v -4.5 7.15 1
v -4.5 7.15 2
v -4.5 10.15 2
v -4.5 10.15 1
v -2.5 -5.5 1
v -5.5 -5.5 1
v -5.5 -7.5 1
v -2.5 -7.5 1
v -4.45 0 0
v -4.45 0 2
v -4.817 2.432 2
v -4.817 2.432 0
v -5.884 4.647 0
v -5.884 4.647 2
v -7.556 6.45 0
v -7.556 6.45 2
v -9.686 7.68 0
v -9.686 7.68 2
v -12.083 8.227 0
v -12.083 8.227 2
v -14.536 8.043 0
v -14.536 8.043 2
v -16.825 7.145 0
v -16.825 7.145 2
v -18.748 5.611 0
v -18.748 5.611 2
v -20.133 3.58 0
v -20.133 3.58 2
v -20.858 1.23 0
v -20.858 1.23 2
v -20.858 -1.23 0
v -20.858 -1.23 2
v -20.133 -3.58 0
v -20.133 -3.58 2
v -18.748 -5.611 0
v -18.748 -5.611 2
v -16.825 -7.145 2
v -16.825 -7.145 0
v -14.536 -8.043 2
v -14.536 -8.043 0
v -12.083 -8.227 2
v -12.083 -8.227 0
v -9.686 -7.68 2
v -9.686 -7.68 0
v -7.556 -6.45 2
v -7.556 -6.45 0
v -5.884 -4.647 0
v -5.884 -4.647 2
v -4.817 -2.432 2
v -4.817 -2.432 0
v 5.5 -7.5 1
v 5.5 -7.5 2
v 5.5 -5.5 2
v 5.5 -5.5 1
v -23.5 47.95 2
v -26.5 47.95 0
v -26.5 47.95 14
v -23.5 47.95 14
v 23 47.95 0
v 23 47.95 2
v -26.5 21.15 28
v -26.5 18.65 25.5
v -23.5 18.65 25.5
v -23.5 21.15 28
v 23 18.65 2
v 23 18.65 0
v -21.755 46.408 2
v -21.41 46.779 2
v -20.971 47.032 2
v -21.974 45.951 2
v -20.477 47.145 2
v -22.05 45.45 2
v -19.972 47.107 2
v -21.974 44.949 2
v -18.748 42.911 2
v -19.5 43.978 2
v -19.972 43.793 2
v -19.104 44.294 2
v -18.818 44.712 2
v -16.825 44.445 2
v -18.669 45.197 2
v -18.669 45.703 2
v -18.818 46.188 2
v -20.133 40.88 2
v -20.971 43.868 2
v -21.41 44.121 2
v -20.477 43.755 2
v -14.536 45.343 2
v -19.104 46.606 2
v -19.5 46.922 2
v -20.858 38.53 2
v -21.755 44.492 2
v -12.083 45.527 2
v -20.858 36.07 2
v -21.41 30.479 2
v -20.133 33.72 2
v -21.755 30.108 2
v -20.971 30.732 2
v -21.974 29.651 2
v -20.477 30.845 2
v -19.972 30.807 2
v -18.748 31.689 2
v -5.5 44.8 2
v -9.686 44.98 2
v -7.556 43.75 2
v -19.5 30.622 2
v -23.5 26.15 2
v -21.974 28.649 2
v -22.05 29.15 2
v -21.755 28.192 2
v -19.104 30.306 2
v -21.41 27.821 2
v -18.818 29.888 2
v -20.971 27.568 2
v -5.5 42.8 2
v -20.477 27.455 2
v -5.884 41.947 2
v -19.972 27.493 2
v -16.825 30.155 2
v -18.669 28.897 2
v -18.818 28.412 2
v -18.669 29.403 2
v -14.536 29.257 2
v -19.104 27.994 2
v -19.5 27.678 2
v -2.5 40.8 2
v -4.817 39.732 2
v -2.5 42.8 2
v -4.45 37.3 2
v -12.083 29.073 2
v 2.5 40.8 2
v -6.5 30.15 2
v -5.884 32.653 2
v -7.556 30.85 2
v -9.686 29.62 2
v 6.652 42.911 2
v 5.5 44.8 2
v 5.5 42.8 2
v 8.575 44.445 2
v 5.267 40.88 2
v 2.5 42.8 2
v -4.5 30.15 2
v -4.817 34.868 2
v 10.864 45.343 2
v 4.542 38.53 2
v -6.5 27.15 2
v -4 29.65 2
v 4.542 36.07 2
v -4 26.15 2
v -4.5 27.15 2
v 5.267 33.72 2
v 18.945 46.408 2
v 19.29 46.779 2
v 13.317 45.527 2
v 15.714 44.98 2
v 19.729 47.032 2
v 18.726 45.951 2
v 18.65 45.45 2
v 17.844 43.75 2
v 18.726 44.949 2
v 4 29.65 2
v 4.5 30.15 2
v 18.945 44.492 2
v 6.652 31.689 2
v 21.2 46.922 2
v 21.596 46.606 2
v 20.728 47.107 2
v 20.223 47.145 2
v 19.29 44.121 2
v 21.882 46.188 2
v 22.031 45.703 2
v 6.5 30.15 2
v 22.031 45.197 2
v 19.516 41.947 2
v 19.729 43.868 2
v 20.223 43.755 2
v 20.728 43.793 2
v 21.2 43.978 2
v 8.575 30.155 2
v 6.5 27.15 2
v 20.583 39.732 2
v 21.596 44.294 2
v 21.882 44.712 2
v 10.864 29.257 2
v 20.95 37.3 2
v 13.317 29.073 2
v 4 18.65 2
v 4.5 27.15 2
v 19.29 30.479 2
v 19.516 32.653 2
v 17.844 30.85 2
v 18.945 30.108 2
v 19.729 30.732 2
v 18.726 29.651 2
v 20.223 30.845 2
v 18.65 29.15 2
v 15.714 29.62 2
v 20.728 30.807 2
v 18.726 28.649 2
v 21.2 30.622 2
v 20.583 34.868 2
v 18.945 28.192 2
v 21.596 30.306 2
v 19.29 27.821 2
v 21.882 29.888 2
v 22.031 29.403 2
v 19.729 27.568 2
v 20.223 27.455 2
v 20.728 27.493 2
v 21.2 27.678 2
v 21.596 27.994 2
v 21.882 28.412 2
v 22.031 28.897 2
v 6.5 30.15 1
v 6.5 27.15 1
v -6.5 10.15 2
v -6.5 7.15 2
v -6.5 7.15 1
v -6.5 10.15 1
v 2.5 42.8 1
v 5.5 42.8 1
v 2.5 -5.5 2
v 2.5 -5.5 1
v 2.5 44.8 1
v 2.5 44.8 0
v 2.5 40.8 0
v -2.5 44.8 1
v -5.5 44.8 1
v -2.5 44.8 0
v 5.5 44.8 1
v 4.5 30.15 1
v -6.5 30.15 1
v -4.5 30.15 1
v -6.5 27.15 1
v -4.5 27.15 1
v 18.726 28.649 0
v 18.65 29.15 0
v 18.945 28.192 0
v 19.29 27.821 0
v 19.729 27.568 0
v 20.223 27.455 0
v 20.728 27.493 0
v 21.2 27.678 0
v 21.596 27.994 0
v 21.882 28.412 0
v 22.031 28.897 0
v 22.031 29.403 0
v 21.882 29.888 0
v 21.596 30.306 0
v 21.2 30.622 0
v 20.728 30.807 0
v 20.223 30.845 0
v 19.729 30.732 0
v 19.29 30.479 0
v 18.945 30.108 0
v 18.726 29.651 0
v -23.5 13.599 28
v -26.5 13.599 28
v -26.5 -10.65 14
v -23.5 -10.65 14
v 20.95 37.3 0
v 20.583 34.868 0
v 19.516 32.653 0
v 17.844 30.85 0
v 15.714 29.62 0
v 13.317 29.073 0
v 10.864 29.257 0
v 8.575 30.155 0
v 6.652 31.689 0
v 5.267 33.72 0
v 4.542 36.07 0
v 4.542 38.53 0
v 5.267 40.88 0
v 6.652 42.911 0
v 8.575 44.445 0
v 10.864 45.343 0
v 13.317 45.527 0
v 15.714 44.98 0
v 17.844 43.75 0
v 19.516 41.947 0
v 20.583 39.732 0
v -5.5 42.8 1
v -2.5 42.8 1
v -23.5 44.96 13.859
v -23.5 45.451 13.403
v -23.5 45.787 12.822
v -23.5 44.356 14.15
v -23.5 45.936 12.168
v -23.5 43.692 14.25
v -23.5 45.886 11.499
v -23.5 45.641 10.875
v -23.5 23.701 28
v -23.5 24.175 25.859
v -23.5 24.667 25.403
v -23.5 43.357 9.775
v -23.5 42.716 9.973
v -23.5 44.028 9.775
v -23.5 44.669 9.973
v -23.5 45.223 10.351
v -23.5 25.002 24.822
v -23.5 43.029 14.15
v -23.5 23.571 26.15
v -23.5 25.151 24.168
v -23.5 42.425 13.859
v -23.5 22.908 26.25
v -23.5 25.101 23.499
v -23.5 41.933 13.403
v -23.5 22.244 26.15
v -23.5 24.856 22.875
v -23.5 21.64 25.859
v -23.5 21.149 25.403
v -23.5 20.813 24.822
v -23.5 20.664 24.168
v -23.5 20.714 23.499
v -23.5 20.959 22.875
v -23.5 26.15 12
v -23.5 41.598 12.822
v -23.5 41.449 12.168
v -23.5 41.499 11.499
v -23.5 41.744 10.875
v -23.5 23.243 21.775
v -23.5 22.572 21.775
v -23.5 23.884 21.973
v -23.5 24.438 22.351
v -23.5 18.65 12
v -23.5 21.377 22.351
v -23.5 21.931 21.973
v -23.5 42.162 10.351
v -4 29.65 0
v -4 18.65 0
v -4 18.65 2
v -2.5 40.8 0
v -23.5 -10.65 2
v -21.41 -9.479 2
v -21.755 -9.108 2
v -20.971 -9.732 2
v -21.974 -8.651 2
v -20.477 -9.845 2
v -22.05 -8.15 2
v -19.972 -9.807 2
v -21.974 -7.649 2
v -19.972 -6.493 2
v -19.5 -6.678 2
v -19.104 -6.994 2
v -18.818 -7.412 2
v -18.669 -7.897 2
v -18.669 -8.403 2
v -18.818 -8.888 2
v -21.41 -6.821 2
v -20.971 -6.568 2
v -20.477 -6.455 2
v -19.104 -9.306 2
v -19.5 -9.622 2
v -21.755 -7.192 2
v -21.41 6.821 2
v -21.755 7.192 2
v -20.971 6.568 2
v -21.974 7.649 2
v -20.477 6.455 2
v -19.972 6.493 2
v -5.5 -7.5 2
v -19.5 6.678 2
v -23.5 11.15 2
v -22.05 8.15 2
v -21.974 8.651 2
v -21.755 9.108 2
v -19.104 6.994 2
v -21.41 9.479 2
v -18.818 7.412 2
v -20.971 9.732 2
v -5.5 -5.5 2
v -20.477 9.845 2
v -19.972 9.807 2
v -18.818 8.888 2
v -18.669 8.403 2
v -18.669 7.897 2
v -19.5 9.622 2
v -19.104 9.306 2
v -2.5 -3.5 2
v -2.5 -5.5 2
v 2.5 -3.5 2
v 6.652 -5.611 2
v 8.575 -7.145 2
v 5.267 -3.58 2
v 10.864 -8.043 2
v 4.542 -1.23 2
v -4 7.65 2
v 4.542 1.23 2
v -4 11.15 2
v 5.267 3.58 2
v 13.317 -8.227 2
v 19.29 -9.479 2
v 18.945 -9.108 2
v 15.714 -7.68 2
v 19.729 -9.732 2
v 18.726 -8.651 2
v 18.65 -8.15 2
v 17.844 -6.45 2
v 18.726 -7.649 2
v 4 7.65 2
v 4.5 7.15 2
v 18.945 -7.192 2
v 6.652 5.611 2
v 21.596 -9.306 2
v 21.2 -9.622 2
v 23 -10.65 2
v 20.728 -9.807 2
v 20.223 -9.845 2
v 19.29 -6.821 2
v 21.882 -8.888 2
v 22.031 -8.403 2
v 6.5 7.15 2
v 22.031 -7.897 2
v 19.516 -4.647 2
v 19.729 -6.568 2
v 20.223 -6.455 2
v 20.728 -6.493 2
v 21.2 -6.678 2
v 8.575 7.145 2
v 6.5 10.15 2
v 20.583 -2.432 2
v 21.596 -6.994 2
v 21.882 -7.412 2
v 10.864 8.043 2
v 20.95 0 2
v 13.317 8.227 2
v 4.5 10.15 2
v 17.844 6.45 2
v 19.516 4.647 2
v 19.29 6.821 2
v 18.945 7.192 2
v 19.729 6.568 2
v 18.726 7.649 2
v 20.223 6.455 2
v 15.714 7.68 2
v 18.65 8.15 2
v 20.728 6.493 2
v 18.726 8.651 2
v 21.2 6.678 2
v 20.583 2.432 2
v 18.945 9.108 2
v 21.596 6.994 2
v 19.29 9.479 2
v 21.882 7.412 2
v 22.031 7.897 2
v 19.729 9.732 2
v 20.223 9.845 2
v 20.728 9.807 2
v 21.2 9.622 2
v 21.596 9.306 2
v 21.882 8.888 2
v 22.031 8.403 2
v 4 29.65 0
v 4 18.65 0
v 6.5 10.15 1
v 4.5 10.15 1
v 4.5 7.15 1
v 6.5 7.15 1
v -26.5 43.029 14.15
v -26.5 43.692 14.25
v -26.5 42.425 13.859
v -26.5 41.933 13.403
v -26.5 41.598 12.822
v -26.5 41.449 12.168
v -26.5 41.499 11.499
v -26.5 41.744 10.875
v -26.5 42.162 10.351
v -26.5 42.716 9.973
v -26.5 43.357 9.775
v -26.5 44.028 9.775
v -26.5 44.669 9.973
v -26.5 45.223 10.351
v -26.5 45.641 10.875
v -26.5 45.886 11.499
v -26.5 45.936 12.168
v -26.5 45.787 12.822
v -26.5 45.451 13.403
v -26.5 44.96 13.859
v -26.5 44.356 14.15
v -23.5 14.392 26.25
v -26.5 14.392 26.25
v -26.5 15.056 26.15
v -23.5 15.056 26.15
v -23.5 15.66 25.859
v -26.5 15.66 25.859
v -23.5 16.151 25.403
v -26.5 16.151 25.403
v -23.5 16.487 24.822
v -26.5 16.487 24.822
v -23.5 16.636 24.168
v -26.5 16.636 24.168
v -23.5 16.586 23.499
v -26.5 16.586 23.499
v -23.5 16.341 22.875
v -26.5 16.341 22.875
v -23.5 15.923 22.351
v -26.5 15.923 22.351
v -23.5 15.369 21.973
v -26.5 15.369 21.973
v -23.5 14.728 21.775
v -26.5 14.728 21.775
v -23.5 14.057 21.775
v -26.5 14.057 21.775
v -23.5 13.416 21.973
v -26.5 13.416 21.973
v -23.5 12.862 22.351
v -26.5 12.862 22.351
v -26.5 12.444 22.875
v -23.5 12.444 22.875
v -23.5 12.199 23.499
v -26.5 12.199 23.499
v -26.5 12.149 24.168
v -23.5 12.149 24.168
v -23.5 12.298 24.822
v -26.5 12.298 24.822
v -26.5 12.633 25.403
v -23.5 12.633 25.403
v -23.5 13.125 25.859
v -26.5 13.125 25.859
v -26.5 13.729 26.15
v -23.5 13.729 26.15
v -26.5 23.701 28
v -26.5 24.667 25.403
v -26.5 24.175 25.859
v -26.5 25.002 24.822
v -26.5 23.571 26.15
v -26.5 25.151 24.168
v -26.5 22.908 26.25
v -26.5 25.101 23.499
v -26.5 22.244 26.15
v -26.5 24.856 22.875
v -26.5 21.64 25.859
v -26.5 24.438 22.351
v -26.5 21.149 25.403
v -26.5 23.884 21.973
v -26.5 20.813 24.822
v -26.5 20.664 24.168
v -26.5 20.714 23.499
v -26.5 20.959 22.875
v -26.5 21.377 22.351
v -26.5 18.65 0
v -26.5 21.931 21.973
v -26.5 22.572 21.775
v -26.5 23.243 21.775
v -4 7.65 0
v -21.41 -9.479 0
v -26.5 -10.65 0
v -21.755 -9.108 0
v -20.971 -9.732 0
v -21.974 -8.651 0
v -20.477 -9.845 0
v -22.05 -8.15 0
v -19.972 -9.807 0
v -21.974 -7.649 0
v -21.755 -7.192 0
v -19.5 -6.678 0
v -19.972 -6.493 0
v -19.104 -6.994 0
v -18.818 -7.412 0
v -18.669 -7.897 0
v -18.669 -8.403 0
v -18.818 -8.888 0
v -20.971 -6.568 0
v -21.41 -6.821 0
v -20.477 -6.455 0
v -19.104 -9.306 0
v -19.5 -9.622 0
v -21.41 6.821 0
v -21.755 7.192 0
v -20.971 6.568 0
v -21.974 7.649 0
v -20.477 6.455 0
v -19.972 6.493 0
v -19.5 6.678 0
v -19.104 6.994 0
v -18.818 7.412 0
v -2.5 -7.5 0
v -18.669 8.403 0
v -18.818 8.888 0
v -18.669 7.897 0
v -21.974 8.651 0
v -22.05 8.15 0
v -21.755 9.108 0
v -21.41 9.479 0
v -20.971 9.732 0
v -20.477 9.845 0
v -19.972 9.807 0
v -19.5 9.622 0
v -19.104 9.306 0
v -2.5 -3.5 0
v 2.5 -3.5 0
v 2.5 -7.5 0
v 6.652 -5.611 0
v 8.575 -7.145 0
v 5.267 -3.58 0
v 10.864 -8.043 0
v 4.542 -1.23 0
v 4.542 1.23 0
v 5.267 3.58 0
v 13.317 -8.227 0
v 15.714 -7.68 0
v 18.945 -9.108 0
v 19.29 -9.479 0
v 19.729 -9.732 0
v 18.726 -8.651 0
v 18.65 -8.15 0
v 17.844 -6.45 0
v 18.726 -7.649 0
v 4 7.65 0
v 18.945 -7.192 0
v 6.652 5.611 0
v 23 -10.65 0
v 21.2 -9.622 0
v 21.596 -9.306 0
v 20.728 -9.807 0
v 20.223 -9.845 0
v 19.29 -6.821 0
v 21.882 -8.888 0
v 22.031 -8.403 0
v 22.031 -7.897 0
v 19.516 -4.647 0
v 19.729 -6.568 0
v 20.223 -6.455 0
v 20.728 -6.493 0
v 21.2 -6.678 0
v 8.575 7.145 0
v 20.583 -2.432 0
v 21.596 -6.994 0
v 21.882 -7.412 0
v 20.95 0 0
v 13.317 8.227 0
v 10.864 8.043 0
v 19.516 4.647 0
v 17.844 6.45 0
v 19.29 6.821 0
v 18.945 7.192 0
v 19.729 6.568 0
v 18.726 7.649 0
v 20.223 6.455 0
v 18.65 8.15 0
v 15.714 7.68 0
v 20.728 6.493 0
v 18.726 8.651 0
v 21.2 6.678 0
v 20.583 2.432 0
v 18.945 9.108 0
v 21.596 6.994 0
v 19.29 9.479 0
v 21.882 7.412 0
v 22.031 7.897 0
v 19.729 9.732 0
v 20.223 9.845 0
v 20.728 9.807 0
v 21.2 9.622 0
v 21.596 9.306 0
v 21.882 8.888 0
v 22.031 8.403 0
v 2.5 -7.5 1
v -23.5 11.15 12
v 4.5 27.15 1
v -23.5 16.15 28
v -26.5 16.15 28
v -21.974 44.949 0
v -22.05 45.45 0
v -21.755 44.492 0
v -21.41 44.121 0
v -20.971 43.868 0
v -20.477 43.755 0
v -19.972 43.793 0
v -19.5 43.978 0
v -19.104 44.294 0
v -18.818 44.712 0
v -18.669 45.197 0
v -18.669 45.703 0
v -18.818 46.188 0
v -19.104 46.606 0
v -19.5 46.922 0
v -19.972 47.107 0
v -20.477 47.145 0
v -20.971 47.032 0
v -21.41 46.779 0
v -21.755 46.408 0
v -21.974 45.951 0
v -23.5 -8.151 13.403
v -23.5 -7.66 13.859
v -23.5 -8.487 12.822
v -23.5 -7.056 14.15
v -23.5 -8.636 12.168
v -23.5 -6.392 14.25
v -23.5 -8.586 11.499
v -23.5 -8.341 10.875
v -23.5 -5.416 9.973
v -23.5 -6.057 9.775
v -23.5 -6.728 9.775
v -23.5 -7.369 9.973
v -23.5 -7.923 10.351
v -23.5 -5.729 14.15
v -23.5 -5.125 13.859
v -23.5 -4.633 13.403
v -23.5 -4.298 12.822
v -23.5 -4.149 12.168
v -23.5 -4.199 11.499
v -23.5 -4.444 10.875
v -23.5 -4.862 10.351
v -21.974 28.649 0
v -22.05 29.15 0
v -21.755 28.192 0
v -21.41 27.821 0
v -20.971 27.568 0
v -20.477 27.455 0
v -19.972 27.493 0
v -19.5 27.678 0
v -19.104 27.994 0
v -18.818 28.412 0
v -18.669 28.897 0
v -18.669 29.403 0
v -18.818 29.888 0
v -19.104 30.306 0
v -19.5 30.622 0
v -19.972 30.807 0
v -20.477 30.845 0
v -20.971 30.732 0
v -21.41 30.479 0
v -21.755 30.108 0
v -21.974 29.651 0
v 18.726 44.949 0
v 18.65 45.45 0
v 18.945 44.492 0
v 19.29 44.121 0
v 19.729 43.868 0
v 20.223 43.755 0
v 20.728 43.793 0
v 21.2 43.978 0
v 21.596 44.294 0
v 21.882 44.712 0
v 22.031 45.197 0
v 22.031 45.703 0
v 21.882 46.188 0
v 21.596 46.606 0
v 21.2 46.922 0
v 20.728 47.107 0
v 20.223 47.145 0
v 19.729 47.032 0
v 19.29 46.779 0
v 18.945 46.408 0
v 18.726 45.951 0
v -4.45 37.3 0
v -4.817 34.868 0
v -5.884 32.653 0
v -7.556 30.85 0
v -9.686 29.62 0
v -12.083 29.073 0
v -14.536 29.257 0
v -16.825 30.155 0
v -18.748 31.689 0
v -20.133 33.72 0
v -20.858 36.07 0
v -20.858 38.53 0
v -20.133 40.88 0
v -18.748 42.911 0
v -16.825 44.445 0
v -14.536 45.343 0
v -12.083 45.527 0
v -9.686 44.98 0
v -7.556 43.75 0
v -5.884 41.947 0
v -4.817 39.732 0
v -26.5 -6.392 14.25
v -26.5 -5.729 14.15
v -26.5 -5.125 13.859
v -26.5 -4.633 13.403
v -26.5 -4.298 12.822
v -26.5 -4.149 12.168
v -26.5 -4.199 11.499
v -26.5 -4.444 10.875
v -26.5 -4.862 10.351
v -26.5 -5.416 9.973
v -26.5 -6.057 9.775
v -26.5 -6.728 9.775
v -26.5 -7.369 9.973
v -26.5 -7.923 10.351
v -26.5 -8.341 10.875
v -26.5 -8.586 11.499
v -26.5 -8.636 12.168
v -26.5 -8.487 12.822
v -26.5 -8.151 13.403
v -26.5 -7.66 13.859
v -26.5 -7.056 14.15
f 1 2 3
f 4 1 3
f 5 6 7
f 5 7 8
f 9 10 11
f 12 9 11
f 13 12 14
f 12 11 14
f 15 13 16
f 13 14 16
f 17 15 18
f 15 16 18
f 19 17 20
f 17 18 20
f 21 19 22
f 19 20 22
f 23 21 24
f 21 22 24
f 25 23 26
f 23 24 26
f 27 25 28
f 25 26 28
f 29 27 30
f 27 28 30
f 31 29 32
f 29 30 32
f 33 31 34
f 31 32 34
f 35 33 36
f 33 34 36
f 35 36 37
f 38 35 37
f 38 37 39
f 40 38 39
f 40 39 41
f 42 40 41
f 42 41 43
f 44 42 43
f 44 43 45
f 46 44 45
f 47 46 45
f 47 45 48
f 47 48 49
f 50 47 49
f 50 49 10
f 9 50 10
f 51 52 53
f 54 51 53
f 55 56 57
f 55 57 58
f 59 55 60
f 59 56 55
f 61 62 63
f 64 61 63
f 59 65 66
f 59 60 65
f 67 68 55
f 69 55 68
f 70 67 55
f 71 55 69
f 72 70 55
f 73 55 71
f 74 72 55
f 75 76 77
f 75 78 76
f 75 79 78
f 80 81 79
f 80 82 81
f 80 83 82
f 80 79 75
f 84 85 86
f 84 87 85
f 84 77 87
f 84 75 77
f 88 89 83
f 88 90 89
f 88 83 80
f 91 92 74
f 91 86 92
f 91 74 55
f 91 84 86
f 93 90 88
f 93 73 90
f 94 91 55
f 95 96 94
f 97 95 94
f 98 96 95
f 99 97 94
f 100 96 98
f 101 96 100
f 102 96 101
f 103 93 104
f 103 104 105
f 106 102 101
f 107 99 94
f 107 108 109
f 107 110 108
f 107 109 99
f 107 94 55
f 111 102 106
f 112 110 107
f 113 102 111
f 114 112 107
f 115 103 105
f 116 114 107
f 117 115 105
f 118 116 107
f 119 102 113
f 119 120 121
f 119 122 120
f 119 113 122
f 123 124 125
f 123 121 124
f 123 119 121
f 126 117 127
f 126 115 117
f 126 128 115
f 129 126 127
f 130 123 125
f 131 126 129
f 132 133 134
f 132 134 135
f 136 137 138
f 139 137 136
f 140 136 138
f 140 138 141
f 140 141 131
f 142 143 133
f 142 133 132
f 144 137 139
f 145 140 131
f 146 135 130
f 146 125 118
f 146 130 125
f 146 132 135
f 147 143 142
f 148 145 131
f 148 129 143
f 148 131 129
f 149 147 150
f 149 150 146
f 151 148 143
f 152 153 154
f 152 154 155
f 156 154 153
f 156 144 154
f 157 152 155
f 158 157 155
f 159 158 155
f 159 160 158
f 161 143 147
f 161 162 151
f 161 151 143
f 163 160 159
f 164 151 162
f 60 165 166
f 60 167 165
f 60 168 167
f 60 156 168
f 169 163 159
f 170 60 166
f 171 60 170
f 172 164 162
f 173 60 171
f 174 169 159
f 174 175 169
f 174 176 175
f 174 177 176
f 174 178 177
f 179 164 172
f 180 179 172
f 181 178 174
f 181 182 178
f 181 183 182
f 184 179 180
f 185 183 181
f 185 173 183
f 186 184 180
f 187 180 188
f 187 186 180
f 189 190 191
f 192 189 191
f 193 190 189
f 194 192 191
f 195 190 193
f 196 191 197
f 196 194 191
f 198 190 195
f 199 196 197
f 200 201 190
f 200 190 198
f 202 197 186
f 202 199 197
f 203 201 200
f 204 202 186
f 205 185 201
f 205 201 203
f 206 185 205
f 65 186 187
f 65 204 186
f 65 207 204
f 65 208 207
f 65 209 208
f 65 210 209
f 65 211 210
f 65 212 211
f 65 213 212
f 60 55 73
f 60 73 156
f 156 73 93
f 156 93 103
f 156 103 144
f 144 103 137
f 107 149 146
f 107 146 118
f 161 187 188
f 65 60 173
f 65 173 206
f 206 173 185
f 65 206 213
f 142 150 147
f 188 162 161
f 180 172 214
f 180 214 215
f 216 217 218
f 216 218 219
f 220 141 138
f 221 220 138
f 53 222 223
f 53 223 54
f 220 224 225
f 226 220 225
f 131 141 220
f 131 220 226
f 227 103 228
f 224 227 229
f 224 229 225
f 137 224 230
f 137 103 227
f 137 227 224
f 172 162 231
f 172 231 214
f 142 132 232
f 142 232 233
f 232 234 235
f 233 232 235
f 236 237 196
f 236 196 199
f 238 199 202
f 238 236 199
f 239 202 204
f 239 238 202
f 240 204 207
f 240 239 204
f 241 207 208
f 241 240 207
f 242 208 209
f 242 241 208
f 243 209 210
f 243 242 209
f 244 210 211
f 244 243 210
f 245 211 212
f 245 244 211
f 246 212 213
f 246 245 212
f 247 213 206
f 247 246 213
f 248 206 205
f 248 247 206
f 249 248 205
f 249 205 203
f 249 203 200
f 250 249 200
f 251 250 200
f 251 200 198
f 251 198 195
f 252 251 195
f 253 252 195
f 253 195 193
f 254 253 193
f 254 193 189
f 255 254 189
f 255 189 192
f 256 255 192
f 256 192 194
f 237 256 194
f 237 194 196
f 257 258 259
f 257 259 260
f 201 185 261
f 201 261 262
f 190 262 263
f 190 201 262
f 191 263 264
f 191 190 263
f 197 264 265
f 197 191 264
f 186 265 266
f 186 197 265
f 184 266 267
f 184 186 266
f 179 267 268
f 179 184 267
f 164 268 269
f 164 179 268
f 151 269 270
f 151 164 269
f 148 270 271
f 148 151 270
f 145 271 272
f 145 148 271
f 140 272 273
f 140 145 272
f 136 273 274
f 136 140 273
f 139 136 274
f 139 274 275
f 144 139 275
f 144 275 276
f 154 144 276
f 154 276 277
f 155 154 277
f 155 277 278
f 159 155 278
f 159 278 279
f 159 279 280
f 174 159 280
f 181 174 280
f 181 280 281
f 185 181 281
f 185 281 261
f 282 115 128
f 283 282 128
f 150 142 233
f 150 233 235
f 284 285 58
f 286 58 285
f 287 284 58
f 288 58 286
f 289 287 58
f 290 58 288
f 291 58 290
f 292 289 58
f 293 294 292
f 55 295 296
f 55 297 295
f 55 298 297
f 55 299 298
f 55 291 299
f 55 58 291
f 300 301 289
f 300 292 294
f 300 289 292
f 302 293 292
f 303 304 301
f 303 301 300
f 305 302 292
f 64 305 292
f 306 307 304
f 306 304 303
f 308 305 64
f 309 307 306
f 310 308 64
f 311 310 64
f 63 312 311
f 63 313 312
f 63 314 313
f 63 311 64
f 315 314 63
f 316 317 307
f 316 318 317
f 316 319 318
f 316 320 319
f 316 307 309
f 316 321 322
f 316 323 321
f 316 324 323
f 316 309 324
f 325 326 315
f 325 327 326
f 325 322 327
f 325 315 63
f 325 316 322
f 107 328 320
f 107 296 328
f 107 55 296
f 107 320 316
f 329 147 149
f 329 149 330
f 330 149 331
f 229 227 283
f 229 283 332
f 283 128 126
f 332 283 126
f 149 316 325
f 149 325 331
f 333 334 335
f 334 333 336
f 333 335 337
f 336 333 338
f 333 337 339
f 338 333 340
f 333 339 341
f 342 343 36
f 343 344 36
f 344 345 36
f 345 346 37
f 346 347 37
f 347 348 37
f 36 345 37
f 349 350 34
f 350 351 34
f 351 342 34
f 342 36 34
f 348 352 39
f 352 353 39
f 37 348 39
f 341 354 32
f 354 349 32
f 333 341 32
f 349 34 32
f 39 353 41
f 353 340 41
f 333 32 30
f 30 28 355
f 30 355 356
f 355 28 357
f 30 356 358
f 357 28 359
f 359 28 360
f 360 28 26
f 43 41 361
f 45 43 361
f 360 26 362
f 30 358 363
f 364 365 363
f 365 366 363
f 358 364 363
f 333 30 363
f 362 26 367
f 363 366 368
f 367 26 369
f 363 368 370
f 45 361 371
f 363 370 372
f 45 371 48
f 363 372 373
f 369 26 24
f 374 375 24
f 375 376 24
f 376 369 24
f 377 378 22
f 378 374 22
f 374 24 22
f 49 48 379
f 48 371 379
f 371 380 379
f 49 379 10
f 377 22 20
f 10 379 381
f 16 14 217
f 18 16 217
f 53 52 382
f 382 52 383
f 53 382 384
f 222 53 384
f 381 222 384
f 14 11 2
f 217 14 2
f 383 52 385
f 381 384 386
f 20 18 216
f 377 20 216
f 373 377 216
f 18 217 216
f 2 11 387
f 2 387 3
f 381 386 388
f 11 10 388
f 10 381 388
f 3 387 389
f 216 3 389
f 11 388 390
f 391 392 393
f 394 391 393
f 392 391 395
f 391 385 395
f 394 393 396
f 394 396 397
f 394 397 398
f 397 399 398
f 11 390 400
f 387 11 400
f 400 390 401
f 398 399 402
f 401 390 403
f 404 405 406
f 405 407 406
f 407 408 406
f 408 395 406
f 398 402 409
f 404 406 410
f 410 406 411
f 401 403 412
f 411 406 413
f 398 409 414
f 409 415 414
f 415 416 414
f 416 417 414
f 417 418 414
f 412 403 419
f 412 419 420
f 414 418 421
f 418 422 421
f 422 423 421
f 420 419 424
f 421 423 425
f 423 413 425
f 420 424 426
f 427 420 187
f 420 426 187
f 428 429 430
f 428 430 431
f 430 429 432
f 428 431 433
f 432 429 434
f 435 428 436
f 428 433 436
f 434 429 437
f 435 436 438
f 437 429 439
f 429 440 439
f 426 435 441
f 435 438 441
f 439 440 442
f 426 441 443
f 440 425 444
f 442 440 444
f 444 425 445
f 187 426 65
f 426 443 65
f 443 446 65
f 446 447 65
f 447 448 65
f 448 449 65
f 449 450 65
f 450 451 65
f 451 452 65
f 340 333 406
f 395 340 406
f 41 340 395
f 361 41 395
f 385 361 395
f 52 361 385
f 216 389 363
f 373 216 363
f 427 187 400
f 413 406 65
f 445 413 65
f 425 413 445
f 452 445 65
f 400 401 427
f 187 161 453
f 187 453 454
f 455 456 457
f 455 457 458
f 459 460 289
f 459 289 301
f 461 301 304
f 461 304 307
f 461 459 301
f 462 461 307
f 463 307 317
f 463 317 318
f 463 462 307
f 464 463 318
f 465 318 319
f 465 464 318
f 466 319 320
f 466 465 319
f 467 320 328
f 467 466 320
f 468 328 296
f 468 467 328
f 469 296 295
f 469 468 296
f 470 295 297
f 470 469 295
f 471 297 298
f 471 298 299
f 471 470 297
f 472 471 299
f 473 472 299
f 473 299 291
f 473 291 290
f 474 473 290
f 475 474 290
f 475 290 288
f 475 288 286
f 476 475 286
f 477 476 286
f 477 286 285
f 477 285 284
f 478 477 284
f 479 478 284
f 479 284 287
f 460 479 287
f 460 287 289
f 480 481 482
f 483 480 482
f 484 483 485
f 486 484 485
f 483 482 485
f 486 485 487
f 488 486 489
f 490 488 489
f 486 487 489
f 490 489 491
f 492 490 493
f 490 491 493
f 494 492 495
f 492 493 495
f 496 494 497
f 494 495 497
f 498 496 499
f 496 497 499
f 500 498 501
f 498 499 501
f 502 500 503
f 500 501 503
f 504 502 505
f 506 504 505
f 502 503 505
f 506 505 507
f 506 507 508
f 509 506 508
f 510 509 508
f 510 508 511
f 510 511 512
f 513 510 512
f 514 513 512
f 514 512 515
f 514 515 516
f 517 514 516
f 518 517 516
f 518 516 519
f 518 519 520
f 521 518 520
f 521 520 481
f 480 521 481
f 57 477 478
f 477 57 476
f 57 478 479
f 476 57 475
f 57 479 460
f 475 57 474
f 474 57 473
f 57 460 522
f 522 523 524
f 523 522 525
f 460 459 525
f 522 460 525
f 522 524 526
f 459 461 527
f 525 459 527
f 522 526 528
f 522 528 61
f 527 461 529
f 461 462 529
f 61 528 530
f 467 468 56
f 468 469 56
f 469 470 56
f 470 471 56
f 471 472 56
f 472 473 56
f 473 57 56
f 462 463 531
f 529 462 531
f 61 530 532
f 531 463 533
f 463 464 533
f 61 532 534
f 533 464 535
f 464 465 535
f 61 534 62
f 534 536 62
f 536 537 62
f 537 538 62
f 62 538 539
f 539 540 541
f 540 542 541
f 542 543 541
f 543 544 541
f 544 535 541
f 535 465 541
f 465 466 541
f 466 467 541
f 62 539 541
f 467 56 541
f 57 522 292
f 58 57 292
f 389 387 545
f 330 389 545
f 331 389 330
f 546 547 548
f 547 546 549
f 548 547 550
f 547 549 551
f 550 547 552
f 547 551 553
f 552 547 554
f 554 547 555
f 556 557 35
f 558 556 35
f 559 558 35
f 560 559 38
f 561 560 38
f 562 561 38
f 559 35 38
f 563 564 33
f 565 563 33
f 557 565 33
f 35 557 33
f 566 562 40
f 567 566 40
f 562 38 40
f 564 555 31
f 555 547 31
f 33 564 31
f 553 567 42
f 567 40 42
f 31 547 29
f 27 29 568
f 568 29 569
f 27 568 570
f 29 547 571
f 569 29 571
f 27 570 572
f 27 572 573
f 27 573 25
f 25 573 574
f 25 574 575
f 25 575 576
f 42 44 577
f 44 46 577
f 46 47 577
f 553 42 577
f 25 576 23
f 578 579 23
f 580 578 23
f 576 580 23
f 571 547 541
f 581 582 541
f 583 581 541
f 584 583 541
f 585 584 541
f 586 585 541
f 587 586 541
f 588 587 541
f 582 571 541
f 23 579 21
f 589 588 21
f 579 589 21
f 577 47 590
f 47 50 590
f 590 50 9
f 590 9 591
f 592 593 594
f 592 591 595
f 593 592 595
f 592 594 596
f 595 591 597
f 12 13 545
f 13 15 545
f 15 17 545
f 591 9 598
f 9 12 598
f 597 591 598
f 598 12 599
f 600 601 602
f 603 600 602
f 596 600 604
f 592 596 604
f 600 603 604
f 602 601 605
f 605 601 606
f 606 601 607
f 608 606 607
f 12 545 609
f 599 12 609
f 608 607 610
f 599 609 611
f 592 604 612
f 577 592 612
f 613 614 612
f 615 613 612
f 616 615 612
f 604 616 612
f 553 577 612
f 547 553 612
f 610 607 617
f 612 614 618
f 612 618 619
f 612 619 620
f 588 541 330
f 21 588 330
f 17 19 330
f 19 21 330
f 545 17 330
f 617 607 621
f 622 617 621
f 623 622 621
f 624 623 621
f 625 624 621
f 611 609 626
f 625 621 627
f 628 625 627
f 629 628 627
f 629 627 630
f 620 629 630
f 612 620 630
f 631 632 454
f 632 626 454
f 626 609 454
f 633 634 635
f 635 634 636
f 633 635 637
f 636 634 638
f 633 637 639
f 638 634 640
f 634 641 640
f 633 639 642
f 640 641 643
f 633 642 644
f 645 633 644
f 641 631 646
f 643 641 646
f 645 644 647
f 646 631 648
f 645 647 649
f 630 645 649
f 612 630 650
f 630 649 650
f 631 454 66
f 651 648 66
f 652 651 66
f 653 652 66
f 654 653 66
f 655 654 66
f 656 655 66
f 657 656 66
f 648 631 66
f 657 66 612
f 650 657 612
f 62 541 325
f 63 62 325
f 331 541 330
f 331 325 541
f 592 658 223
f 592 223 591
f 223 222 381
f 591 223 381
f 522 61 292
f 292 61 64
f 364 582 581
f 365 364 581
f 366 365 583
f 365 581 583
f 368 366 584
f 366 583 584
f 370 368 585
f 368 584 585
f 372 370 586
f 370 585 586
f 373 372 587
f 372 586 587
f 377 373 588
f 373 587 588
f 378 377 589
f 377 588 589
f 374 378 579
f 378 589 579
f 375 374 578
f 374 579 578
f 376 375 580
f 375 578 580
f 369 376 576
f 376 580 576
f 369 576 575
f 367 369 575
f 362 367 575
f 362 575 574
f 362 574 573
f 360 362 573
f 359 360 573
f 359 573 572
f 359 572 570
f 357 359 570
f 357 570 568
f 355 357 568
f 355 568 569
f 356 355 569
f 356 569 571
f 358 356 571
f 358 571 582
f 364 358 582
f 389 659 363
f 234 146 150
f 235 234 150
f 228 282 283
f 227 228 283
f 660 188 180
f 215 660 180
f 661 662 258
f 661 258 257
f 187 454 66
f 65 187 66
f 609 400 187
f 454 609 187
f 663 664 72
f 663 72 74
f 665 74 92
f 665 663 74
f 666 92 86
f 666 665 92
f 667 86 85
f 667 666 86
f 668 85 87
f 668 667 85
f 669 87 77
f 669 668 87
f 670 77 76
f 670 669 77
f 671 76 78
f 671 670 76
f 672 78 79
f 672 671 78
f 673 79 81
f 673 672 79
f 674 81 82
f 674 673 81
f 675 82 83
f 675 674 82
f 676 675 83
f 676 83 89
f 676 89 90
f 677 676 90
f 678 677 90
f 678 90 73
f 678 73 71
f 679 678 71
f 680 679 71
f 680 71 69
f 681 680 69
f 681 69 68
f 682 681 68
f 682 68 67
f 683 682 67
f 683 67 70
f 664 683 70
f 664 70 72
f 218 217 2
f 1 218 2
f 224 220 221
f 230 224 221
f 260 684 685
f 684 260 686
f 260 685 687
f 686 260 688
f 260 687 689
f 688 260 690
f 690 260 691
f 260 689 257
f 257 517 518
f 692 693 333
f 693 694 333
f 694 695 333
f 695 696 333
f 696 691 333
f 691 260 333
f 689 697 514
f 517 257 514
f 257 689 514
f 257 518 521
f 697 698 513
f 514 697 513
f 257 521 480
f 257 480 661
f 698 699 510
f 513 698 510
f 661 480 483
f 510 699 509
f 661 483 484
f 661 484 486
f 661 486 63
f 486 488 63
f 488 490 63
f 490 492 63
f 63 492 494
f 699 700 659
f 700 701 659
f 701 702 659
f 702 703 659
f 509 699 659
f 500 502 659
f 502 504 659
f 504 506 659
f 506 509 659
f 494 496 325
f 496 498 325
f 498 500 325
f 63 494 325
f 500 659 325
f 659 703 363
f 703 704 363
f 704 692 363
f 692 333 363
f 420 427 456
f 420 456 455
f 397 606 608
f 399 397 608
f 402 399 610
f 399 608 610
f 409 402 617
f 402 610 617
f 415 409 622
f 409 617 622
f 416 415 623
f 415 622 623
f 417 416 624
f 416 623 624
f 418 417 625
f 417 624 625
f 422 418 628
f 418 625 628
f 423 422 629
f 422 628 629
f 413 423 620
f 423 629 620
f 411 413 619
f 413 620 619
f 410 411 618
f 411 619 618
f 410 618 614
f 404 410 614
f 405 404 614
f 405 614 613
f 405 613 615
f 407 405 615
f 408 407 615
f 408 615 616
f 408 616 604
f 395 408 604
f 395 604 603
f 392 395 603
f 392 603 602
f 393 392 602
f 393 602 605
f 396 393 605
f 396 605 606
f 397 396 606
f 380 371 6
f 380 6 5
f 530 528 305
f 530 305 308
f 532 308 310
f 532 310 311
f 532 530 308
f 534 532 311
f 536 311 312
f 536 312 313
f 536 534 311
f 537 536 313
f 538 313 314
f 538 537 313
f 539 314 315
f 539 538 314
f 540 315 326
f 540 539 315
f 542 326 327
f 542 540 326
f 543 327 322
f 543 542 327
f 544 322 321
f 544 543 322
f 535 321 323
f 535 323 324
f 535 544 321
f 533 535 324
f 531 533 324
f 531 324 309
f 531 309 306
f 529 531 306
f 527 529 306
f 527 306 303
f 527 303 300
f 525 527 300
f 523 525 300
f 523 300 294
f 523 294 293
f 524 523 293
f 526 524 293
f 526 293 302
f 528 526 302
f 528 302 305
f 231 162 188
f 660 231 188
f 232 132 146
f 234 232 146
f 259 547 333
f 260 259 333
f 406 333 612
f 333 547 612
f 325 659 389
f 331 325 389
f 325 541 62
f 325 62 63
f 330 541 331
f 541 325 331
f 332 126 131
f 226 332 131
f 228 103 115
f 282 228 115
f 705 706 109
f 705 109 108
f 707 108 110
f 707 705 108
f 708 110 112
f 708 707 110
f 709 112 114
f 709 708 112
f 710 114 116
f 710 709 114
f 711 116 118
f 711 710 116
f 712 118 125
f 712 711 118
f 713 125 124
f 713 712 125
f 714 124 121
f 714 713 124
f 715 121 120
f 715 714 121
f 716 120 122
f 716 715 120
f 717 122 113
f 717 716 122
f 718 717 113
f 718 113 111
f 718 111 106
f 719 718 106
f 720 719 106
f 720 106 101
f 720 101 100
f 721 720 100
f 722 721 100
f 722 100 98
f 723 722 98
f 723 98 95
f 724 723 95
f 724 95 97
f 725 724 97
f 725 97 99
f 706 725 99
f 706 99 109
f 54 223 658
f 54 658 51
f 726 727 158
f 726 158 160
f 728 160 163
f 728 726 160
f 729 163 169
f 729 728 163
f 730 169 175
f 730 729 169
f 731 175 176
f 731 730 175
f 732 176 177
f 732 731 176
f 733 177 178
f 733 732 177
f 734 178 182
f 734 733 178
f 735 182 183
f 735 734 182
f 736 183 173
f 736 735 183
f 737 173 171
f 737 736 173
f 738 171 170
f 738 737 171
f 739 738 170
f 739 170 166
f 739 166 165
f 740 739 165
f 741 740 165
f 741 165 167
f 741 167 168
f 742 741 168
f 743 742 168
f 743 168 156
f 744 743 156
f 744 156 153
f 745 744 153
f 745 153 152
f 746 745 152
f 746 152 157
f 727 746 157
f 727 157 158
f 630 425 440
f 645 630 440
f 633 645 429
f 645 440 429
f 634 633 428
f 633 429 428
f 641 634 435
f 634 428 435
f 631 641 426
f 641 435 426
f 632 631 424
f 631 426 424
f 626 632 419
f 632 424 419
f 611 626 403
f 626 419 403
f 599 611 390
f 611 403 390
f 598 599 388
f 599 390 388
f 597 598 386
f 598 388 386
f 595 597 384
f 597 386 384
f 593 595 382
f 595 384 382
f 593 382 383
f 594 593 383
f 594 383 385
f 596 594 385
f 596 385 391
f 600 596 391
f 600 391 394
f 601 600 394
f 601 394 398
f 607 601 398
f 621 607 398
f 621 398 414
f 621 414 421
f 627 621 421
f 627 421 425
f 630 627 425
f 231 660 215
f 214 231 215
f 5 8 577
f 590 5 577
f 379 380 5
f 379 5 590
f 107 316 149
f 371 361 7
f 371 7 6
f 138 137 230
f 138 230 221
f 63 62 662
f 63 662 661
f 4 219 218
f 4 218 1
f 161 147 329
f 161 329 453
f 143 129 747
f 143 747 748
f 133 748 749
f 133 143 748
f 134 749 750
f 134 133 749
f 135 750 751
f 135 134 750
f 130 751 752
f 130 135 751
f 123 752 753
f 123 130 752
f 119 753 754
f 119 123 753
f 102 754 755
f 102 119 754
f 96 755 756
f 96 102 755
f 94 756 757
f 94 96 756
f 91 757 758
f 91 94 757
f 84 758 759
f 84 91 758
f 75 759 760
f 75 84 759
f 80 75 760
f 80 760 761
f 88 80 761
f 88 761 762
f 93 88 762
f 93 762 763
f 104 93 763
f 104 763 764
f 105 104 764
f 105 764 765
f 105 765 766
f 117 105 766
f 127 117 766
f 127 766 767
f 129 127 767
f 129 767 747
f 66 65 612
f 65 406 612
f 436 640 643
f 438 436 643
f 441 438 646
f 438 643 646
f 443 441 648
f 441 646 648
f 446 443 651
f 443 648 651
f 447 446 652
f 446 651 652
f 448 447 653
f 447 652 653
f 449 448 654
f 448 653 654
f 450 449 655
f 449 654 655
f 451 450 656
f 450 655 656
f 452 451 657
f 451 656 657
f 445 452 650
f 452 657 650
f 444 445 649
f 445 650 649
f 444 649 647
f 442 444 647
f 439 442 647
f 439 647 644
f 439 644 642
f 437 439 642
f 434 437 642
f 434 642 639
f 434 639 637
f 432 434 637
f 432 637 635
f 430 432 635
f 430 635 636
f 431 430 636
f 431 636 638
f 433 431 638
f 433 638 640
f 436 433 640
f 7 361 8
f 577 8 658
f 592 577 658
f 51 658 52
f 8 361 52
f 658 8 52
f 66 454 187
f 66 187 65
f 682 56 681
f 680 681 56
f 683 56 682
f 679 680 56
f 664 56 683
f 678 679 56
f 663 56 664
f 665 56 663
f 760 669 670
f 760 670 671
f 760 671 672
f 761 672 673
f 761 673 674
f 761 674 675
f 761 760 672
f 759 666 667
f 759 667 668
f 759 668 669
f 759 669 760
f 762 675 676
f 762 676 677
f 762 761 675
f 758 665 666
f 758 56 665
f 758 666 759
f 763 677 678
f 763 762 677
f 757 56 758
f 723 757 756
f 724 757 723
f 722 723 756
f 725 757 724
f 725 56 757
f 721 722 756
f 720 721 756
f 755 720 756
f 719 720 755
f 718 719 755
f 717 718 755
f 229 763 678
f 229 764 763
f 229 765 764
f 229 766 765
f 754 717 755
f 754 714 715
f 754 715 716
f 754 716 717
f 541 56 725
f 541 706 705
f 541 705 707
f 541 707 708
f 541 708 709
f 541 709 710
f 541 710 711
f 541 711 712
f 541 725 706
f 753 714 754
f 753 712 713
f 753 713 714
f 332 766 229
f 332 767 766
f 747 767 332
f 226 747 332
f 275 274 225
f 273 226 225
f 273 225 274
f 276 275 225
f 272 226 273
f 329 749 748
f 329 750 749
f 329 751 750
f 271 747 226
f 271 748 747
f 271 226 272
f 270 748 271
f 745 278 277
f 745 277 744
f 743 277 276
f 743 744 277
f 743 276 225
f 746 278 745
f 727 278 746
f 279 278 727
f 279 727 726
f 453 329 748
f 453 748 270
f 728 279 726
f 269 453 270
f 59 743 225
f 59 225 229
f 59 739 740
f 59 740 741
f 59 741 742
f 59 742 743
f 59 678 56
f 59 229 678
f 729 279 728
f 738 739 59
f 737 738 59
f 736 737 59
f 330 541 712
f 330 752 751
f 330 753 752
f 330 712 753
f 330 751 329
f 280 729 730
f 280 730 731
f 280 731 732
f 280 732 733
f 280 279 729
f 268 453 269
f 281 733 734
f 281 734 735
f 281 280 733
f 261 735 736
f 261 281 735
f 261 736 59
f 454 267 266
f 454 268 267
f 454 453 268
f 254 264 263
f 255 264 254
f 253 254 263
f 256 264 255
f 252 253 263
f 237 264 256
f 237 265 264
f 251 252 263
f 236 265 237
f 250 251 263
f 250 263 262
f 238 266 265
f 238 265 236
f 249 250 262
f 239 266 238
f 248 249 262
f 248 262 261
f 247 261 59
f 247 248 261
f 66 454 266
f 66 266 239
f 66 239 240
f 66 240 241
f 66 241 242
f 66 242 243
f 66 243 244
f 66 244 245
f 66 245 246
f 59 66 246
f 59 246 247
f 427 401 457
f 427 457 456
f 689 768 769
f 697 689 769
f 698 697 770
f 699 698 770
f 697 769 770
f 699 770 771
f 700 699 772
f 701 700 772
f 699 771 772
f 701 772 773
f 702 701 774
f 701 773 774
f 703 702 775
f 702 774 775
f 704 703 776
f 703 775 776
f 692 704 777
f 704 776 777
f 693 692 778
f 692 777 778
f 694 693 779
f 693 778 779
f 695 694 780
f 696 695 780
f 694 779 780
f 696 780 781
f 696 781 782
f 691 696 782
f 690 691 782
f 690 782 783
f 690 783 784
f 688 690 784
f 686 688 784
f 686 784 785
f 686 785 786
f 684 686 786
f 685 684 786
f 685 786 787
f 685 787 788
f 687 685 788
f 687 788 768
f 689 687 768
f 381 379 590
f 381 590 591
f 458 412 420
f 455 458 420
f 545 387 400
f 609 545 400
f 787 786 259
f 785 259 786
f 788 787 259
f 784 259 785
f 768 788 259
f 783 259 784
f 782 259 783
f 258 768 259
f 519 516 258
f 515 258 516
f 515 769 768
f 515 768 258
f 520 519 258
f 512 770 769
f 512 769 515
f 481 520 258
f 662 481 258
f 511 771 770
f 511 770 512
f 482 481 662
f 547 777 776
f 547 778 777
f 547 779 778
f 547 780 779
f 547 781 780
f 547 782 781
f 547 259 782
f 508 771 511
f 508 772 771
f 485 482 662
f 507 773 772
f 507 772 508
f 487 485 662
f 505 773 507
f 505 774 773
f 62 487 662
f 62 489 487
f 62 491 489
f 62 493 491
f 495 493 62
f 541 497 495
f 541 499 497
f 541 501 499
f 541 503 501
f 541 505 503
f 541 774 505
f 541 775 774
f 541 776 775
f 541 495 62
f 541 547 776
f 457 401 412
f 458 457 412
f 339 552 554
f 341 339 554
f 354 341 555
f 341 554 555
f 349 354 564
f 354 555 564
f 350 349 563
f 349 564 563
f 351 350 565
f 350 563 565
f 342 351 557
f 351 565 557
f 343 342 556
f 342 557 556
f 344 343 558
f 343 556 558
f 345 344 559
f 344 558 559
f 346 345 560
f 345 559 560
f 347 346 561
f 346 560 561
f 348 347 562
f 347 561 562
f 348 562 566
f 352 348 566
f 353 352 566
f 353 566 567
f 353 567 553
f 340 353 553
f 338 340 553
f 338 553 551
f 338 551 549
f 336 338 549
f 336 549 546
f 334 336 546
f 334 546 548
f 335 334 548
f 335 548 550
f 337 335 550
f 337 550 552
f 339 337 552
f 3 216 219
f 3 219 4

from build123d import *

# Parameters (mm, degrees)
SKETCH_1_W          = 46
SKETCH_1_H          = 21.3
EXTRUDE_1_DEPTH     = 2
SKETCH_2_R          = 8.25
CUT_EXTRUDE_1_DEPTH = 26.424840216
SKETCH_3_W          = 8
SKETCH_3_H          = 3
CUT_EXTRUDE_2_DEPTH = 26.424840216
SKETCH_4_W          = 5
SKETCH_4_H          = 4
CUT_EXTRUDE_3_DEPTH = 26.424840216
SKETCH_5_W          = 3
SKETCH_5_H          = 2
SKETCH_5_W_2        = 2
SKETCH_5_H_2        = 3
CUT_EXTRUDE_4_DEPTH = 1
HOLE_WIZARD_M3_1_D  = 3.4
SKETCH_9_W          = 46
SKETCH_9_H          = 2
EXTRUDE_3_DEPTH     = 8
SKETCH_10_W         = 8
SKETCH_10_H         = 8
CUT_EXTRUDE_5_DEPTH = 30.678653945
SKETCH_11_W         = 2
SKETCH_11_H         = 29.3
EXTRUDE_4_DEPTH     = 0.5
SKETCH_12_W         = 3
SKETCH_12_H         = 29.3
EXTRUDE_5_DEPTH     = 28
HOLE_WIZARD_M4_1_D  = 4.5
CHAMFER_1_SIZE      = 14
CHAMFER_1_SIZE2     = 24.248711306
CHAMFER_2_SIZE      = 2.5
RIB_1_REACH         = 50.423
SKETCH_16_WALL_W    = 120.75963785
SKETCH_16_WALL_H    = 7.5


with BuildPart() as part:
    # 草圖1 → 填料-伸長1 (new body)
    with BuildSketch(Plane.XY):
        Rectangle(SKETCH_1_W, SKETCH_1_H)
    extrude(amount=EXTRUDE_1_DEPTH)

    # 草圖2 → 除料-伸長1 (cut, through all)
    with BuildSketch(Plane.XY.offset(2)):
        with Locations((-12.7, 0)):
            Circle(SKETCH_2_R)
        with Locations((12.7, 0)):
            Circle(SKETCH_2_R)
    extrude(amount=-CUT_EXTRUDE_1_DEPTH, mode=Mode.SUBTRACT)

    # 草圖3 → 除料-伸長2 (cut, through all)
    with BuildSketch(Plane.XY.offset(2)):
        with Locations((0, 9.15)):
            Rectangle(SKETCH_3_W, SKETCH_3_H)
    extrude(amount=-CUT_EXTRUDE_2_DEPTH, mode=Mode.SUBTRACT)

    # 草圖4 → 除料-伸長3 (cut, through all)
    with BuildSketch(Plane.XY.offset(2)):
        with Locations((0, -5.5)):
            Rectangle(SKETCH_4_W, SKETCH_4_H)
    extrude(amount=-CUT_EXTRUDE_3_DEPTH, mode=Mode.SUBTRACT)

    # 草圖5 → 除料-伸長4 (cut)
    with BuildSketch(Plane.XY.offset(2)):
        with Locations((4, -6.5)):
            Rectangle(SKETCH_5_W, SKETCH_5_H)
        with Locations((-5.5, 8.65)):
            Rectangle(SKETCH_5_W_2, SKETCH_5_H_2)
        with Locations((5.5, 8.65)):
            Rectangle(SKETCH_5_W_2, SKETCH_5_H_2)
        with Locations((-4, -6.5)):
            Rectangle(SKETCH_5_W, SKETCH_5_H)
    extrude(amount=-CUT_EXTRUDE_4_DEPTH, mode=Mode.SUBTRACT)

    # M3 餘隙孔1 (through all)
    with Locations(Plane.XY.offset(2)):
        with Locations((20.35, 8.15), (-20.35, -8.15), (-20.35, 8.15), (20.35, -8.15)):
            Hole(HOLE_WIZARD_M3_1_D / 2)

    # 草圖9 → 填料-伸長3 (add)
    with BuildSketch(Plane(origin=(0, 10.65, 0), x_dir=(1, 0, 0), z_dir=(0, 1, 0))):
        with Locations((0, -1)):
            Rectangle(SKETCH_9_W, SKETCH_9_H)
    extrude(amount=EXTRUDE_3_DEPTH)

    # 草圖10 → 除料-伸長5 (cut, through all)
    with BuildSketch(Plane.XY.offset(2)):
        with Locations((0, 14.65)):
            Rectangle(SKETCH_10_W, SKETCH_10_H)
    extrude(amount=-CUT_EXTRUDE_5_DEPTH, mode=Mode.SUBTRACT)

    # 草圖11 → 填料-伸長4 (add)
    with BuildSketch(Plane.ZY.offset(23)):
        with Locations((1, 4)):
            Rectangle(SKETCH_11_W, SKETCH_11_H)
    extrude(amount=EXTRUDE_4_DEPTH)

    # 草圖12 → 填料-伸長5 (add)
    with BuildSketch(Plane.XY):
        with Locations((-25, 4)):
            Rectangle(SKETCH_12_W, SKETCH_12_H)
    extrude(amount=EXTRUDE_5_DEPTH)

    # M4 餘隙孔1 (through all)
    with Locations(Plane(origin=(-23.5, 0, 0), x_dir=(0, 0, -1), z_dir=(1, 0, 0))):
        with Locations((-24, 14.392304845), (-12, -6.392304845)):
            Hole(HOLE_WIZARD_M4_1_D / 2)

    # 導角1
    chamfer_1_edges = [part.edges().sort_by_distance(p)[0] for p in [
        (-25, -10.65, 28),
    ]]
    chamfer_1_side = [part.faces().sort_by_distance(p)[0] for p in [
        (22.431295331, -10.65, 1),
    ]]
    chamfer(chamfer_1_edges, length=CHAMFER_1_SIZE, length2=CHAMFER_1_SIZE2, reference=chamfer_1_side[0])

    # 導角2
    chamfer_2_edges = [part.edges().sort_by_distance(p)[0] for p in [
        (-25, 18.65, 28),
    ]]
    chamfer(chamfer_2_edges, length=CHAMFER_2_SIZE)

    # 草圖16 wall → 肋材1 (add, up to next)
    with BuildSketch(Plane(origin=(-13.75, 18.65, 7), x_dir=(0.889817462813, 0, -0.456316647596), z_dir=(-0.456316647596, 0, -0.889817462813)), mode=Mode.PRIVATE) as rib_1_sk1:
        with Locations((0, 3.75)):
            Rectangle(SKETCH_16_WALL_W, SKETCH_16_WALL_H)
    rib_1_tool1 = extrude(rib_1_sk1.sketch, amount=RIB_1_REACH, mode=Mode.PRIVATE) - part.part
    add(rib_1_tool1.solids().sort_by_distance((-13.75, 18.65, 7))[0])


with BuildPart() as body_2:
    # 鏡射1: mirrored copy
    add(part.part.mirror(Plane.ZX.offset(18.65)))


solid = Compound([part.part, body_2.part])
